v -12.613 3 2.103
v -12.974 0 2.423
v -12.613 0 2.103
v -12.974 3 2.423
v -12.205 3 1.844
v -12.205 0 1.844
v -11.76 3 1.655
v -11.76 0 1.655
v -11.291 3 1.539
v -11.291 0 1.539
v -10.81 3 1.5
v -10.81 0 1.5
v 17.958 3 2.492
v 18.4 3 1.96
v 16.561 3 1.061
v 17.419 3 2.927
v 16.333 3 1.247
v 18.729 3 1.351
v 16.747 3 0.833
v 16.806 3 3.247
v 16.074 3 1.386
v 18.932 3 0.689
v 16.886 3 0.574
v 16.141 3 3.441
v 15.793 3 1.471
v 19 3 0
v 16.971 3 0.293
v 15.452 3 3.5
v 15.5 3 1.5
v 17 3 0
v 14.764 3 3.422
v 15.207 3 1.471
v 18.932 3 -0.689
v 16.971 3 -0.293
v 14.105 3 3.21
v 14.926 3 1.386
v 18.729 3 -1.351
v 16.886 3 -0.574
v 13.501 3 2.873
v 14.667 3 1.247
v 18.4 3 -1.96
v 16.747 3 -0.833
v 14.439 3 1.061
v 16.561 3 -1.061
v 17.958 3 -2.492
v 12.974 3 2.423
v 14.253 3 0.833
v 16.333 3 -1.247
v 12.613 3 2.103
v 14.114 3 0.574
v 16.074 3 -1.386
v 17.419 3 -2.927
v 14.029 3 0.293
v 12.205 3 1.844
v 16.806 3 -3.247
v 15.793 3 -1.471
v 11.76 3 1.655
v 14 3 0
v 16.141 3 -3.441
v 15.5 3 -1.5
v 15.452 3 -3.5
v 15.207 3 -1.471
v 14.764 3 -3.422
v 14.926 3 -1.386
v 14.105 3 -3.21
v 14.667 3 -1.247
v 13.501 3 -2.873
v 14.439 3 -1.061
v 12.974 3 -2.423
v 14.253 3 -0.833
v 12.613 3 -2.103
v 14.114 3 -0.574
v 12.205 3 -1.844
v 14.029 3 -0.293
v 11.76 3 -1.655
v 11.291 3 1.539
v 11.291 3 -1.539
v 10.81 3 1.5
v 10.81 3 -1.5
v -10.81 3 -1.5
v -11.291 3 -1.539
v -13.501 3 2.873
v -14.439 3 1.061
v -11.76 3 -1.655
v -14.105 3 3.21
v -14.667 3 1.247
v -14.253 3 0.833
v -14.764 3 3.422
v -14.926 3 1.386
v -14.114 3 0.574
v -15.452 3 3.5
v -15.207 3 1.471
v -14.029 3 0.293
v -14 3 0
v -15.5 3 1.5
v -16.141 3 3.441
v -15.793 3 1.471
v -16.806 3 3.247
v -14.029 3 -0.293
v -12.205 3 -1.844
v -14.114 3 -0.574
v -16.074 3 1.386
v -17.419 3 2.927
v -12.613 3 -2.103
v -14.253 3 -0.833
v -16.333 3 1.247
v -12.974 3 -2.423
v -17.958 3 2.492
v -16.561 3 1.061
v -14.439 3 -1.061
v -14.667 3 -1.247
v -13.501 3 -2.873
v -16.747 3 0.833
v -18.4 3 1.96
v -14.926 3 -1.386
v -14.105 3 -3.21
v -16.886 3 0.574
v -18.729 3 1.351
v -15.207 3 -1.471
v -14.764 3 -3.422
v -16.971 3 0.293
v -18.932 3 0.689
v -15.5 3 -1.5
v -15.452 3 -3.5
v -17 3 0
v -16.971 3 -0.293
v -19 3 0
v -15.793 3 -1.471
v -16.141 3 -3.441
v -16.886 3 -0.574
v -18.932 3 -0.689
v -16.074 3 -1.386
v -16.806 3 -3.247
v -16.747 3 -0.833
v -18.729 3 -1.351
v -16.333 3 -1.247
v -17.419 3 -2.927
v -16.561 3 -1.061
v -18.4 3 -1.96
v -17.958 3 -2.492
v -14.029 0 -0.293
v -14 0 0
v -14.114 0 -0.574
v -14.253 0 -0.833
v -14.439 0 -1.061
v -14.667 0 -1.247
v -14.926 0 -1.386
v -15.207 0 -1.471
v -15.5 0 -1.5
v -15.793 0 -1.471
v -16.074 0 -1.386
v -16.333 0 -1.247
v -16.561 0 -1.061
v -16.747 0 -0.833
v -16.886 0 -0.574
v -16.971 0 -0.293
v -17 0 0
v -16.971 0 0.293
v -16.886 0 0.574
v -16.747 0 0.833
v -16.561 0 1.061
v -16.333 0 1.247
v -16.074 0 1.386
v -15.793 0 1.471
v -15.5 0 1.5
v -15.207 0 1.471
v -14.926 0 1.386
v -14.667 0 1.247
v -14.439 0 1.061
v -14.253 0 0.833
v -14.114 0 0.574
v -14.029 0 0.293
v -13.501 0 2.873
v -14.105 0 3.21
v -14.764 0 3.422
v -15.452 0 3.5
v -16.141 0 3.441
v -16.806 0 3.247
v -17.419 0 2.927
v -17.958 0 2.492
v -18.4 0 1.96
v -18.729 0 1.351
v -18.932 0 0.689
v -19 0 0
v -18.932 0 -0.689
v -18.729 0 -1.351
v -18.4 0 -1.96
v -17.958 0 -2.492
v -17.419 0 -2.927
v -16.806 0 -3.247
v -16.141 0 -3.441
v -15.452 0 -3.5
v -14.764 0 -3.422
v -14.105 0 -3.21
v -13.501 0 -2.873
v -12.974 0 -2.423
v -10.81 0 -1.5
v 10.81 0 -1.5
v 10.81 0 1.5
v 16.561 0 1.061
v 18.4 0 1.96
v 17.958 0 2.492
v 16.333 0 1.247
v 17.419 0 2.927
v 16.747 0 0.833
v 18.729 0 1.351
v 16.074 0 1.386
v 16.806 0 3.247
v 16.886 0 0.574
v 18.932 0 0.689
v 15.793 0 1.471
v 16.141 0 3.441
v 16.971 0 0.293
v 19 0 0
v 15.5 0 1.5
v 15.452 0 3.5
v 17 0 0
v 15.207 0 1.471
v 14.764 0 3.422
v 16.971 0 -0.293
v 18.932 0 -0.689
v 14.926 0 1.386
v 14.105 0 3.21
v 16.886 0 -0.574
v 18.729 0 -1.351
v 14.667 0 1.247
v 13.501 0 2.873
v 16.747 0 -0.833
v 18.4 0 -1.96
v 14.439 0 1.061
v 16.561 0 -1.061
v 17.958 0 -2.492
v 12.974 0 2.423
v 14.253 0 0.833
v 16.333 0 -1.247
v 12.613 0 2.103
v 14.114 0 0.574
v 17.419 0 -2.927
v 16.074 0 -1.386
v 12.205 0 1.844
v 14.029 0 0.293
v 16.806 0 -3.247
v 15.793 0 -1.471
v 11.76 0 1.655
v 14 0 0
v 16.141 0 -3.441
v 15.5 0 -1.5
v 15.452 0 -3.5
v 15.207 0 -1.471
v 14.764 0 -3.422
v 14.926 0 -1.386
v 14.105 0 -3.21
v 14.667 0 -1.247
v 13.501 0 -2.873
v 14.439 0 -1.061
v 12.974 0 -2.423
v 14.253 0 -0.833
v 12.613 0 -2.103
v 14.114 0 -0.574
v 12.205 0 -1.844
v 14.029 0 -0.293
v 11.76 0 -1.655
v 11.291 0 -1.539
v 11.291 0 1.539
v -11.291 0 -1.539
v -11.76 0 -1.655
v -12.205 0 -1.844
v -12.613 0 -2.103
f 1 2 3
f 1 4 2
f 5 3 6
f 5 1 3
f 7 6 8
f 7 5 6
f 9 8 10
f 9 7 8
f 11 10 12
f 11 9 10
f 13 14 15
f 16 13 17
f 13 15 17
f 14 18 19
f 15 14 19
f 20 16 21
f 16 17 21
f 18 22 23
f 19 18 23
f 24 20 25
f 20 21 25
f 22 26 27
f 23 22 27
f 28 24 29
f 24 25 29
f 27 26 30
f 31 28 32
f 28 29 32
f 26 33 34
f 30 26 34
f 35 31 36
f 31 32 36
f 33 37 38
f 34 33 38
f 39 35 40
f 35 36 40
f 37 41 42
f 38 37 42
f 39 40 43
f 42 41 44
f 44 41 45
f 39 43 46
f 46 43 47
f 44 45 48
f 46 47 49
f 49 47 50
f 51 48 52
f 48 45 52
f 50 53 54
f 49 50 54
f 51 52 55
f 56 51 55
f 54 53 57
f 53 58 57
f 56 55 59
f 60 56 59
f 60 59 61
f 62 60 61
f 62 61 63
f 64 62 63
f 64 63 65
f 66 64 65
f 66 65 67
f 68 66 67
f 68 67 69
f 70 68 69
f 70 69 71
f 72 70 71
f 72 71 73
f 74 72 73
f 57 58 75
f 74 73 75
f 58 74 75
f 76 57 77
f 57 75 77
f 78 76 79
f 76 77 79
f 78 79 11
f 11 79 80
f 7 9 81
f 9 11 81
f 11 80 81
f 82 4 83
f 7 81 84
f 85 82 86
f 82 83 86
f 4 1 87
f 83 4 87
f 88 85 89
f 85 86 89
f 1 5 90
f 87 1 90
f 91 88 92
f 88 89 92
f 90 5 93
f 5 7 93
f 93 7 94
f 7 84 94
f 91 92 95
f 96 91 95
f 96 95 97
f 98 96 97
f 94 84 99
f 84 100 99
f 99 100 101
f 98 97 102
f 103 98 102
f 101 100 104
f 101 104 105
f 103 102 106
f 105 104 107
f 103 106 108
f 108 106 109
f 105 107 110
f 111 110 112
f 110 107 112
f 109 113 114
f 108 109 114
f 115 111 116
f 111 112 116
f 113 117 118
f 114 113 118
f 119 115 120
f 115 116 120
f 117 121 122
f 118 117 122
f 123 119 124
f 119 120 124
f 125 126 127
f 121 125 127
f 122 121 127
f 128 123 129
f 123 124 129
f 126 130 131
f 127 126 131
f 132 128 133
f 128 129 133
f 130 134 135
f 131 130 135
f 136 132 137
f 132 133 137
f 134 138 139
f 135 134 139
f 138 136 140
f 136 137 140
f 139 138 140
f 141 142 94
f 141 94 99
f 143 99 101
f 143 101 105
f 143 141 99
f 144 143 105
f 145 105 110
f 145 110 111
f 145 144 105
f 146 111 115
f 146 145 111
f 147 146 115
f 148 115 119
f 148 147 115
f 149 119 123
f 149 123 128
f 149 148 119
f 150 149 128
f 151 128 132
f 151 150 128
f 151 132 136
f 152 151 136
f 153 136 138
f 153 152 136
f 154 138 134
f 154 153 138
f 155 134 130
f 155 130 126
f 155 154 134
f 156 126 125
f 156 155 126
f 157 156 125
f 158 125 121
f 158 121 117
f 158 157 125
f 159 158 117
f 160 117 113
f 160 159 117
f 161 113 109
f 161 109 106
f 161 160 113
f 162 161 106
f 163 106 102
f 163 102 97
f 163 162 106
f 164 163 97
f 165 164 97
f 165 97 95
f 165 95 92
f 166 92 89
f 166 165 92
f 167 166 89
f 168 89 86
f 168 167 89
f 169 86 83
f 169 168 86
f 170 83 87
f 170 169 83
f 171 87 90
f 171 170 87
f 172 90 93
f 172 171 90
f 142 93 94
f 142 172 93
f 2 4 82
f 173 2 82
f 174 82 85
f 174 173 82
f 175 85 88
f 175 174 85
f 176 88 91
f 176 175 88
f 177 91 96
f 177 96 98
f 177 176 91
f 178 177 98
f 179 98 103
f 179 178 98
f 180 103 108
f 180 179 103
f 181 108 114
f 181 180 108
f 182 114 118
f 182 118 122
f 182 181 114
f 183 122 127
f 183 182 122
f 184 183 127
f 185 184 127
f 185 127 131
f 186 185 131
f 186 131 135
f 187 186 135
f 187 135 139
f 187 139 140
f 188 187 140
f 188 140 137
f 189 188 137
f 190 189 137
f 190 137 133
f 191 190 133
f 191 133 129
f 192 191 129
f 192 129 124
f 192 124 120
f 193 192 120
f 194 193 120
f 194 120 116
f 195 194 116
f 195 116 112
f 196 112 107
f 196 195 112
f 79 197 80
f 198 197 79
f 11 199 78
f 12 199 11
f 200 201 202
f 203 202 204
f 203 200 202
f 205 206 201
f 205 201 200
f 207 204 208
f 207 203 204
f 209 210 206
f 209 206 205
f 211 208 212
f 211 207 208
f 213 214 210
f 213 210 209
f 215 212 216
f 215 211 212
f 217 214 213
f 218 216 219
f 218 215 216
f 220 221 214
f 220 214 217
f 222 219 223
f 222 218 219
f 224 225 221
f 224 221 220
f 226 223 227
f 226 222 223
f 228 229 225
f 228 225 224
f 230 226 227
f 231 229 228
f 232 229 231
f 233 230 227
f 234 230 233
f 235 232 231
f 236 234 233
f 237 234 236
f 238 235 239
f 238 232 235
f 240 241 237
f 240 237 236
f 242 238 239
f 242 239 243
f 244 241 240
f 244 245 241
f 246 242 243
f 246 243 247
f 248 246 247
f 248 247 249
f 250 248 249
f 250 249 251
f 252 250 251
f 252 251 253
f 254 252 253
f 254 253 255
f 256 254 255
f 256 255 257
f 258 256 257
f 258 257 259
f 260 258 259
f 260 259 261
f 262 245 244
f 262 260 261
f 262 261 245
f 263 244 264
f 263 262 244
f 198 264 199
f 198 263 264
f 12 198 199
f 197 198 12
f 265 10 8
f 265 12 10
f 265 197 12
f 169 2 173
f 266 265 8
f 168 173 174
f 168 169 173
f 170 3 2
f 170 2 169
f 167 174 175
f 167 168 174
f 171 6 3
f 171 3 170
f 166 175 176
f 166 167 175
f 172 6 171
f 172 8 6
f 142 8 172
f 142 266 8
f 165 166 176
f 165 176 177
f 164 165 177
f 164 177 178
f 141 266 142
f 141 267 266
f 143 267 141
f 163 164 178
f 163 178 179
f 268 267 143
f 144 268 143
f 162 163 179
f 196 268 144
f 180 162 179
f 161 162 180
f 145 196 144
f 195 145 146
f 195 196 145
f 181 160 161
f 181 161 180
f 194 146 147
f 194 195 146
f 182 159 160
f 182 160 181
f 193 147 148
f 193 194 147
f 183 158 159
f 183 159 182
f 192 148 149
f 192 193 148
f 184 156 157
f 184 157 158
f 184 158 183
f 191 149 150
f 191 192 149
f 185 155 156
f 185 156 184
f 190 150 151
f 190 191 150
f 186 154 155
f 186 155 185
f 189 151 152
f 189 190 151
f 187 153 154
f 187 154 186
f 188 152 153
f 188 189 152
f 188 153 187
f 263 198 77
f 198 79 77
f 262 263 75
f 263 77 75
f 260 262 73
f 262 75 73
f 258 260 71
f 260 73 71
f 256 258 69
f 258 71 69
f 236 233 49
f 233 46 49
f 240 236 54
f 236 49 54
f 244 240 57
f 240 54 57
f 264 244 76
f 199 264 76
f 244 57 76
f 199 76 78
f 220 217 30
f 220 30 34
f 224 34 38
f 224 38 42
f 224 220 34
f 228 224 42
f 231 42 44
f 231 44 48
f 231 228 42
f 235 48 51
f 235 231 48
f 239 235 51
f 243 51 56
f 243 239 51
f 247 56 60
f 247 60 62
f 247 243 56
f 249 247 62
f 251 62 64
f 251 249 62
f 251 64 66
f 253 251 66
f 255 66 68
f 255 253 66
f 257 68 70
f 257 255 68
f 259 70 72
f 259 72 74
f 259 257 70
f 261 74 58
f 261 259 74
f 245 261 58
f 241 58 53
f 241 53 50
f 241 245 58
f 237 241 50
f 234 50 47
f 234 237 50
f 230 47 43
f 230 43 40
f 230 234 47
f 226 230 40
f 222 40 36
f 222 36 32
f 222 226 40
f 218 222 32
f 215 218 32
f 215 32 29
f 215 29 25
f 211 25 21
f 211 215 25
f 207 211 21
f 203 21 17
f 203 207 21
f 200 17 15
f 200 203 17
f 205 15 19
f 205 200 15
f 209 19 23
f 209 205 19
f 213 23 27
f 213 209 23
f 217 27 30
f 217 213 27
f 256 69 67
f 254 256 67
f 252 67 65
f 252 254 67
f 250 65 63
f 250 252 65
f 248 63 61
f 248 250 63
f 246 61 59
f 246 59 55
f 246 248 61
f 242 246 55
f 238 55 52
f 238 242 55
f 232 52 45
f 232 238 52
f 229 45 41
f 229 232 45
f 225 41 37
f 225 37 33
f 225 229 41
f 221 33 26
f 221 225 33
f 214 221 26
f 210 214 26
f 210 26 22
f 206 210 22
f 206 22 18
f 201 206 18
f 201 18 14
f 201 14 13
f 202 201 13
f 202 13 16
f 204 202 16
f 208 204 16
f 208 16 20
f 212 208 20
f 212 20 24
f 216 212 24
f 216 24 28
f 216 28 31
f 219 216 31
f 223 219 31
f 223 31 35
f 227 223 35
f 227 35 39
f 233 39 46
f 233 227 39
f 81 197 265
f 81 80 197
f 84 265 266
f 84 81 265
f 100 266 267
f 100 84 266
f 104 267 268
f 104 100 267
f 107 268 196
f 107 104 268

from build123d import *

# Parameters (mm, degrees)
SKETCH1_R           = 1.5
BOSS_EXTRUDE1_DEPTH = 3
FILLET1_R           = 3


with BuildPart() as part:
    # Sketch1 → Boss-Extrude1 (new body)
    with BuildSketch(Plane(origin=(0, 0, 0), x_dir=(1, 0, 0), z_dir=(0, 1, 0))):
        with BuildLine():
            Line((-12.33772234, 1.5), (12.33772234, 1.5))
            ThreePointArc((12.33772234, 1.5), (19, 0), (12.33772234, -1.5))
            Line((12.33772234, -1.5), (-12.33772234, -1.5))
            ThreePointArc((-12.33772234, -1.5), (-19, 0), (-12.33772234, 1.5))
        make_face()
        with Locations((-15.5, 0)):
            Circle(SKETCH1_R, mode=Mode.SUBTRACT)
        with Locations((15.5, 0)):
            Circle(SKETCH1_R, mode=Mode.SUBTRACT)
    extrude(amount=BOSS_EXTRUDE1_DEPTH)

    # Fillet1
    fillet1_edges = [part.edges().sort_by_distance(p)[0] for p in [
        (-12.33772234, 1.5, -1.5),
        (12.33772234, 1.5, -1.5),
        (12.33772234, 1.5, 1.5),
        (-12.33772234, 1.5, 1.5),
    ]]
    fillet(fillet1_edges, radius=FILLET1_R)


solid = part.part
